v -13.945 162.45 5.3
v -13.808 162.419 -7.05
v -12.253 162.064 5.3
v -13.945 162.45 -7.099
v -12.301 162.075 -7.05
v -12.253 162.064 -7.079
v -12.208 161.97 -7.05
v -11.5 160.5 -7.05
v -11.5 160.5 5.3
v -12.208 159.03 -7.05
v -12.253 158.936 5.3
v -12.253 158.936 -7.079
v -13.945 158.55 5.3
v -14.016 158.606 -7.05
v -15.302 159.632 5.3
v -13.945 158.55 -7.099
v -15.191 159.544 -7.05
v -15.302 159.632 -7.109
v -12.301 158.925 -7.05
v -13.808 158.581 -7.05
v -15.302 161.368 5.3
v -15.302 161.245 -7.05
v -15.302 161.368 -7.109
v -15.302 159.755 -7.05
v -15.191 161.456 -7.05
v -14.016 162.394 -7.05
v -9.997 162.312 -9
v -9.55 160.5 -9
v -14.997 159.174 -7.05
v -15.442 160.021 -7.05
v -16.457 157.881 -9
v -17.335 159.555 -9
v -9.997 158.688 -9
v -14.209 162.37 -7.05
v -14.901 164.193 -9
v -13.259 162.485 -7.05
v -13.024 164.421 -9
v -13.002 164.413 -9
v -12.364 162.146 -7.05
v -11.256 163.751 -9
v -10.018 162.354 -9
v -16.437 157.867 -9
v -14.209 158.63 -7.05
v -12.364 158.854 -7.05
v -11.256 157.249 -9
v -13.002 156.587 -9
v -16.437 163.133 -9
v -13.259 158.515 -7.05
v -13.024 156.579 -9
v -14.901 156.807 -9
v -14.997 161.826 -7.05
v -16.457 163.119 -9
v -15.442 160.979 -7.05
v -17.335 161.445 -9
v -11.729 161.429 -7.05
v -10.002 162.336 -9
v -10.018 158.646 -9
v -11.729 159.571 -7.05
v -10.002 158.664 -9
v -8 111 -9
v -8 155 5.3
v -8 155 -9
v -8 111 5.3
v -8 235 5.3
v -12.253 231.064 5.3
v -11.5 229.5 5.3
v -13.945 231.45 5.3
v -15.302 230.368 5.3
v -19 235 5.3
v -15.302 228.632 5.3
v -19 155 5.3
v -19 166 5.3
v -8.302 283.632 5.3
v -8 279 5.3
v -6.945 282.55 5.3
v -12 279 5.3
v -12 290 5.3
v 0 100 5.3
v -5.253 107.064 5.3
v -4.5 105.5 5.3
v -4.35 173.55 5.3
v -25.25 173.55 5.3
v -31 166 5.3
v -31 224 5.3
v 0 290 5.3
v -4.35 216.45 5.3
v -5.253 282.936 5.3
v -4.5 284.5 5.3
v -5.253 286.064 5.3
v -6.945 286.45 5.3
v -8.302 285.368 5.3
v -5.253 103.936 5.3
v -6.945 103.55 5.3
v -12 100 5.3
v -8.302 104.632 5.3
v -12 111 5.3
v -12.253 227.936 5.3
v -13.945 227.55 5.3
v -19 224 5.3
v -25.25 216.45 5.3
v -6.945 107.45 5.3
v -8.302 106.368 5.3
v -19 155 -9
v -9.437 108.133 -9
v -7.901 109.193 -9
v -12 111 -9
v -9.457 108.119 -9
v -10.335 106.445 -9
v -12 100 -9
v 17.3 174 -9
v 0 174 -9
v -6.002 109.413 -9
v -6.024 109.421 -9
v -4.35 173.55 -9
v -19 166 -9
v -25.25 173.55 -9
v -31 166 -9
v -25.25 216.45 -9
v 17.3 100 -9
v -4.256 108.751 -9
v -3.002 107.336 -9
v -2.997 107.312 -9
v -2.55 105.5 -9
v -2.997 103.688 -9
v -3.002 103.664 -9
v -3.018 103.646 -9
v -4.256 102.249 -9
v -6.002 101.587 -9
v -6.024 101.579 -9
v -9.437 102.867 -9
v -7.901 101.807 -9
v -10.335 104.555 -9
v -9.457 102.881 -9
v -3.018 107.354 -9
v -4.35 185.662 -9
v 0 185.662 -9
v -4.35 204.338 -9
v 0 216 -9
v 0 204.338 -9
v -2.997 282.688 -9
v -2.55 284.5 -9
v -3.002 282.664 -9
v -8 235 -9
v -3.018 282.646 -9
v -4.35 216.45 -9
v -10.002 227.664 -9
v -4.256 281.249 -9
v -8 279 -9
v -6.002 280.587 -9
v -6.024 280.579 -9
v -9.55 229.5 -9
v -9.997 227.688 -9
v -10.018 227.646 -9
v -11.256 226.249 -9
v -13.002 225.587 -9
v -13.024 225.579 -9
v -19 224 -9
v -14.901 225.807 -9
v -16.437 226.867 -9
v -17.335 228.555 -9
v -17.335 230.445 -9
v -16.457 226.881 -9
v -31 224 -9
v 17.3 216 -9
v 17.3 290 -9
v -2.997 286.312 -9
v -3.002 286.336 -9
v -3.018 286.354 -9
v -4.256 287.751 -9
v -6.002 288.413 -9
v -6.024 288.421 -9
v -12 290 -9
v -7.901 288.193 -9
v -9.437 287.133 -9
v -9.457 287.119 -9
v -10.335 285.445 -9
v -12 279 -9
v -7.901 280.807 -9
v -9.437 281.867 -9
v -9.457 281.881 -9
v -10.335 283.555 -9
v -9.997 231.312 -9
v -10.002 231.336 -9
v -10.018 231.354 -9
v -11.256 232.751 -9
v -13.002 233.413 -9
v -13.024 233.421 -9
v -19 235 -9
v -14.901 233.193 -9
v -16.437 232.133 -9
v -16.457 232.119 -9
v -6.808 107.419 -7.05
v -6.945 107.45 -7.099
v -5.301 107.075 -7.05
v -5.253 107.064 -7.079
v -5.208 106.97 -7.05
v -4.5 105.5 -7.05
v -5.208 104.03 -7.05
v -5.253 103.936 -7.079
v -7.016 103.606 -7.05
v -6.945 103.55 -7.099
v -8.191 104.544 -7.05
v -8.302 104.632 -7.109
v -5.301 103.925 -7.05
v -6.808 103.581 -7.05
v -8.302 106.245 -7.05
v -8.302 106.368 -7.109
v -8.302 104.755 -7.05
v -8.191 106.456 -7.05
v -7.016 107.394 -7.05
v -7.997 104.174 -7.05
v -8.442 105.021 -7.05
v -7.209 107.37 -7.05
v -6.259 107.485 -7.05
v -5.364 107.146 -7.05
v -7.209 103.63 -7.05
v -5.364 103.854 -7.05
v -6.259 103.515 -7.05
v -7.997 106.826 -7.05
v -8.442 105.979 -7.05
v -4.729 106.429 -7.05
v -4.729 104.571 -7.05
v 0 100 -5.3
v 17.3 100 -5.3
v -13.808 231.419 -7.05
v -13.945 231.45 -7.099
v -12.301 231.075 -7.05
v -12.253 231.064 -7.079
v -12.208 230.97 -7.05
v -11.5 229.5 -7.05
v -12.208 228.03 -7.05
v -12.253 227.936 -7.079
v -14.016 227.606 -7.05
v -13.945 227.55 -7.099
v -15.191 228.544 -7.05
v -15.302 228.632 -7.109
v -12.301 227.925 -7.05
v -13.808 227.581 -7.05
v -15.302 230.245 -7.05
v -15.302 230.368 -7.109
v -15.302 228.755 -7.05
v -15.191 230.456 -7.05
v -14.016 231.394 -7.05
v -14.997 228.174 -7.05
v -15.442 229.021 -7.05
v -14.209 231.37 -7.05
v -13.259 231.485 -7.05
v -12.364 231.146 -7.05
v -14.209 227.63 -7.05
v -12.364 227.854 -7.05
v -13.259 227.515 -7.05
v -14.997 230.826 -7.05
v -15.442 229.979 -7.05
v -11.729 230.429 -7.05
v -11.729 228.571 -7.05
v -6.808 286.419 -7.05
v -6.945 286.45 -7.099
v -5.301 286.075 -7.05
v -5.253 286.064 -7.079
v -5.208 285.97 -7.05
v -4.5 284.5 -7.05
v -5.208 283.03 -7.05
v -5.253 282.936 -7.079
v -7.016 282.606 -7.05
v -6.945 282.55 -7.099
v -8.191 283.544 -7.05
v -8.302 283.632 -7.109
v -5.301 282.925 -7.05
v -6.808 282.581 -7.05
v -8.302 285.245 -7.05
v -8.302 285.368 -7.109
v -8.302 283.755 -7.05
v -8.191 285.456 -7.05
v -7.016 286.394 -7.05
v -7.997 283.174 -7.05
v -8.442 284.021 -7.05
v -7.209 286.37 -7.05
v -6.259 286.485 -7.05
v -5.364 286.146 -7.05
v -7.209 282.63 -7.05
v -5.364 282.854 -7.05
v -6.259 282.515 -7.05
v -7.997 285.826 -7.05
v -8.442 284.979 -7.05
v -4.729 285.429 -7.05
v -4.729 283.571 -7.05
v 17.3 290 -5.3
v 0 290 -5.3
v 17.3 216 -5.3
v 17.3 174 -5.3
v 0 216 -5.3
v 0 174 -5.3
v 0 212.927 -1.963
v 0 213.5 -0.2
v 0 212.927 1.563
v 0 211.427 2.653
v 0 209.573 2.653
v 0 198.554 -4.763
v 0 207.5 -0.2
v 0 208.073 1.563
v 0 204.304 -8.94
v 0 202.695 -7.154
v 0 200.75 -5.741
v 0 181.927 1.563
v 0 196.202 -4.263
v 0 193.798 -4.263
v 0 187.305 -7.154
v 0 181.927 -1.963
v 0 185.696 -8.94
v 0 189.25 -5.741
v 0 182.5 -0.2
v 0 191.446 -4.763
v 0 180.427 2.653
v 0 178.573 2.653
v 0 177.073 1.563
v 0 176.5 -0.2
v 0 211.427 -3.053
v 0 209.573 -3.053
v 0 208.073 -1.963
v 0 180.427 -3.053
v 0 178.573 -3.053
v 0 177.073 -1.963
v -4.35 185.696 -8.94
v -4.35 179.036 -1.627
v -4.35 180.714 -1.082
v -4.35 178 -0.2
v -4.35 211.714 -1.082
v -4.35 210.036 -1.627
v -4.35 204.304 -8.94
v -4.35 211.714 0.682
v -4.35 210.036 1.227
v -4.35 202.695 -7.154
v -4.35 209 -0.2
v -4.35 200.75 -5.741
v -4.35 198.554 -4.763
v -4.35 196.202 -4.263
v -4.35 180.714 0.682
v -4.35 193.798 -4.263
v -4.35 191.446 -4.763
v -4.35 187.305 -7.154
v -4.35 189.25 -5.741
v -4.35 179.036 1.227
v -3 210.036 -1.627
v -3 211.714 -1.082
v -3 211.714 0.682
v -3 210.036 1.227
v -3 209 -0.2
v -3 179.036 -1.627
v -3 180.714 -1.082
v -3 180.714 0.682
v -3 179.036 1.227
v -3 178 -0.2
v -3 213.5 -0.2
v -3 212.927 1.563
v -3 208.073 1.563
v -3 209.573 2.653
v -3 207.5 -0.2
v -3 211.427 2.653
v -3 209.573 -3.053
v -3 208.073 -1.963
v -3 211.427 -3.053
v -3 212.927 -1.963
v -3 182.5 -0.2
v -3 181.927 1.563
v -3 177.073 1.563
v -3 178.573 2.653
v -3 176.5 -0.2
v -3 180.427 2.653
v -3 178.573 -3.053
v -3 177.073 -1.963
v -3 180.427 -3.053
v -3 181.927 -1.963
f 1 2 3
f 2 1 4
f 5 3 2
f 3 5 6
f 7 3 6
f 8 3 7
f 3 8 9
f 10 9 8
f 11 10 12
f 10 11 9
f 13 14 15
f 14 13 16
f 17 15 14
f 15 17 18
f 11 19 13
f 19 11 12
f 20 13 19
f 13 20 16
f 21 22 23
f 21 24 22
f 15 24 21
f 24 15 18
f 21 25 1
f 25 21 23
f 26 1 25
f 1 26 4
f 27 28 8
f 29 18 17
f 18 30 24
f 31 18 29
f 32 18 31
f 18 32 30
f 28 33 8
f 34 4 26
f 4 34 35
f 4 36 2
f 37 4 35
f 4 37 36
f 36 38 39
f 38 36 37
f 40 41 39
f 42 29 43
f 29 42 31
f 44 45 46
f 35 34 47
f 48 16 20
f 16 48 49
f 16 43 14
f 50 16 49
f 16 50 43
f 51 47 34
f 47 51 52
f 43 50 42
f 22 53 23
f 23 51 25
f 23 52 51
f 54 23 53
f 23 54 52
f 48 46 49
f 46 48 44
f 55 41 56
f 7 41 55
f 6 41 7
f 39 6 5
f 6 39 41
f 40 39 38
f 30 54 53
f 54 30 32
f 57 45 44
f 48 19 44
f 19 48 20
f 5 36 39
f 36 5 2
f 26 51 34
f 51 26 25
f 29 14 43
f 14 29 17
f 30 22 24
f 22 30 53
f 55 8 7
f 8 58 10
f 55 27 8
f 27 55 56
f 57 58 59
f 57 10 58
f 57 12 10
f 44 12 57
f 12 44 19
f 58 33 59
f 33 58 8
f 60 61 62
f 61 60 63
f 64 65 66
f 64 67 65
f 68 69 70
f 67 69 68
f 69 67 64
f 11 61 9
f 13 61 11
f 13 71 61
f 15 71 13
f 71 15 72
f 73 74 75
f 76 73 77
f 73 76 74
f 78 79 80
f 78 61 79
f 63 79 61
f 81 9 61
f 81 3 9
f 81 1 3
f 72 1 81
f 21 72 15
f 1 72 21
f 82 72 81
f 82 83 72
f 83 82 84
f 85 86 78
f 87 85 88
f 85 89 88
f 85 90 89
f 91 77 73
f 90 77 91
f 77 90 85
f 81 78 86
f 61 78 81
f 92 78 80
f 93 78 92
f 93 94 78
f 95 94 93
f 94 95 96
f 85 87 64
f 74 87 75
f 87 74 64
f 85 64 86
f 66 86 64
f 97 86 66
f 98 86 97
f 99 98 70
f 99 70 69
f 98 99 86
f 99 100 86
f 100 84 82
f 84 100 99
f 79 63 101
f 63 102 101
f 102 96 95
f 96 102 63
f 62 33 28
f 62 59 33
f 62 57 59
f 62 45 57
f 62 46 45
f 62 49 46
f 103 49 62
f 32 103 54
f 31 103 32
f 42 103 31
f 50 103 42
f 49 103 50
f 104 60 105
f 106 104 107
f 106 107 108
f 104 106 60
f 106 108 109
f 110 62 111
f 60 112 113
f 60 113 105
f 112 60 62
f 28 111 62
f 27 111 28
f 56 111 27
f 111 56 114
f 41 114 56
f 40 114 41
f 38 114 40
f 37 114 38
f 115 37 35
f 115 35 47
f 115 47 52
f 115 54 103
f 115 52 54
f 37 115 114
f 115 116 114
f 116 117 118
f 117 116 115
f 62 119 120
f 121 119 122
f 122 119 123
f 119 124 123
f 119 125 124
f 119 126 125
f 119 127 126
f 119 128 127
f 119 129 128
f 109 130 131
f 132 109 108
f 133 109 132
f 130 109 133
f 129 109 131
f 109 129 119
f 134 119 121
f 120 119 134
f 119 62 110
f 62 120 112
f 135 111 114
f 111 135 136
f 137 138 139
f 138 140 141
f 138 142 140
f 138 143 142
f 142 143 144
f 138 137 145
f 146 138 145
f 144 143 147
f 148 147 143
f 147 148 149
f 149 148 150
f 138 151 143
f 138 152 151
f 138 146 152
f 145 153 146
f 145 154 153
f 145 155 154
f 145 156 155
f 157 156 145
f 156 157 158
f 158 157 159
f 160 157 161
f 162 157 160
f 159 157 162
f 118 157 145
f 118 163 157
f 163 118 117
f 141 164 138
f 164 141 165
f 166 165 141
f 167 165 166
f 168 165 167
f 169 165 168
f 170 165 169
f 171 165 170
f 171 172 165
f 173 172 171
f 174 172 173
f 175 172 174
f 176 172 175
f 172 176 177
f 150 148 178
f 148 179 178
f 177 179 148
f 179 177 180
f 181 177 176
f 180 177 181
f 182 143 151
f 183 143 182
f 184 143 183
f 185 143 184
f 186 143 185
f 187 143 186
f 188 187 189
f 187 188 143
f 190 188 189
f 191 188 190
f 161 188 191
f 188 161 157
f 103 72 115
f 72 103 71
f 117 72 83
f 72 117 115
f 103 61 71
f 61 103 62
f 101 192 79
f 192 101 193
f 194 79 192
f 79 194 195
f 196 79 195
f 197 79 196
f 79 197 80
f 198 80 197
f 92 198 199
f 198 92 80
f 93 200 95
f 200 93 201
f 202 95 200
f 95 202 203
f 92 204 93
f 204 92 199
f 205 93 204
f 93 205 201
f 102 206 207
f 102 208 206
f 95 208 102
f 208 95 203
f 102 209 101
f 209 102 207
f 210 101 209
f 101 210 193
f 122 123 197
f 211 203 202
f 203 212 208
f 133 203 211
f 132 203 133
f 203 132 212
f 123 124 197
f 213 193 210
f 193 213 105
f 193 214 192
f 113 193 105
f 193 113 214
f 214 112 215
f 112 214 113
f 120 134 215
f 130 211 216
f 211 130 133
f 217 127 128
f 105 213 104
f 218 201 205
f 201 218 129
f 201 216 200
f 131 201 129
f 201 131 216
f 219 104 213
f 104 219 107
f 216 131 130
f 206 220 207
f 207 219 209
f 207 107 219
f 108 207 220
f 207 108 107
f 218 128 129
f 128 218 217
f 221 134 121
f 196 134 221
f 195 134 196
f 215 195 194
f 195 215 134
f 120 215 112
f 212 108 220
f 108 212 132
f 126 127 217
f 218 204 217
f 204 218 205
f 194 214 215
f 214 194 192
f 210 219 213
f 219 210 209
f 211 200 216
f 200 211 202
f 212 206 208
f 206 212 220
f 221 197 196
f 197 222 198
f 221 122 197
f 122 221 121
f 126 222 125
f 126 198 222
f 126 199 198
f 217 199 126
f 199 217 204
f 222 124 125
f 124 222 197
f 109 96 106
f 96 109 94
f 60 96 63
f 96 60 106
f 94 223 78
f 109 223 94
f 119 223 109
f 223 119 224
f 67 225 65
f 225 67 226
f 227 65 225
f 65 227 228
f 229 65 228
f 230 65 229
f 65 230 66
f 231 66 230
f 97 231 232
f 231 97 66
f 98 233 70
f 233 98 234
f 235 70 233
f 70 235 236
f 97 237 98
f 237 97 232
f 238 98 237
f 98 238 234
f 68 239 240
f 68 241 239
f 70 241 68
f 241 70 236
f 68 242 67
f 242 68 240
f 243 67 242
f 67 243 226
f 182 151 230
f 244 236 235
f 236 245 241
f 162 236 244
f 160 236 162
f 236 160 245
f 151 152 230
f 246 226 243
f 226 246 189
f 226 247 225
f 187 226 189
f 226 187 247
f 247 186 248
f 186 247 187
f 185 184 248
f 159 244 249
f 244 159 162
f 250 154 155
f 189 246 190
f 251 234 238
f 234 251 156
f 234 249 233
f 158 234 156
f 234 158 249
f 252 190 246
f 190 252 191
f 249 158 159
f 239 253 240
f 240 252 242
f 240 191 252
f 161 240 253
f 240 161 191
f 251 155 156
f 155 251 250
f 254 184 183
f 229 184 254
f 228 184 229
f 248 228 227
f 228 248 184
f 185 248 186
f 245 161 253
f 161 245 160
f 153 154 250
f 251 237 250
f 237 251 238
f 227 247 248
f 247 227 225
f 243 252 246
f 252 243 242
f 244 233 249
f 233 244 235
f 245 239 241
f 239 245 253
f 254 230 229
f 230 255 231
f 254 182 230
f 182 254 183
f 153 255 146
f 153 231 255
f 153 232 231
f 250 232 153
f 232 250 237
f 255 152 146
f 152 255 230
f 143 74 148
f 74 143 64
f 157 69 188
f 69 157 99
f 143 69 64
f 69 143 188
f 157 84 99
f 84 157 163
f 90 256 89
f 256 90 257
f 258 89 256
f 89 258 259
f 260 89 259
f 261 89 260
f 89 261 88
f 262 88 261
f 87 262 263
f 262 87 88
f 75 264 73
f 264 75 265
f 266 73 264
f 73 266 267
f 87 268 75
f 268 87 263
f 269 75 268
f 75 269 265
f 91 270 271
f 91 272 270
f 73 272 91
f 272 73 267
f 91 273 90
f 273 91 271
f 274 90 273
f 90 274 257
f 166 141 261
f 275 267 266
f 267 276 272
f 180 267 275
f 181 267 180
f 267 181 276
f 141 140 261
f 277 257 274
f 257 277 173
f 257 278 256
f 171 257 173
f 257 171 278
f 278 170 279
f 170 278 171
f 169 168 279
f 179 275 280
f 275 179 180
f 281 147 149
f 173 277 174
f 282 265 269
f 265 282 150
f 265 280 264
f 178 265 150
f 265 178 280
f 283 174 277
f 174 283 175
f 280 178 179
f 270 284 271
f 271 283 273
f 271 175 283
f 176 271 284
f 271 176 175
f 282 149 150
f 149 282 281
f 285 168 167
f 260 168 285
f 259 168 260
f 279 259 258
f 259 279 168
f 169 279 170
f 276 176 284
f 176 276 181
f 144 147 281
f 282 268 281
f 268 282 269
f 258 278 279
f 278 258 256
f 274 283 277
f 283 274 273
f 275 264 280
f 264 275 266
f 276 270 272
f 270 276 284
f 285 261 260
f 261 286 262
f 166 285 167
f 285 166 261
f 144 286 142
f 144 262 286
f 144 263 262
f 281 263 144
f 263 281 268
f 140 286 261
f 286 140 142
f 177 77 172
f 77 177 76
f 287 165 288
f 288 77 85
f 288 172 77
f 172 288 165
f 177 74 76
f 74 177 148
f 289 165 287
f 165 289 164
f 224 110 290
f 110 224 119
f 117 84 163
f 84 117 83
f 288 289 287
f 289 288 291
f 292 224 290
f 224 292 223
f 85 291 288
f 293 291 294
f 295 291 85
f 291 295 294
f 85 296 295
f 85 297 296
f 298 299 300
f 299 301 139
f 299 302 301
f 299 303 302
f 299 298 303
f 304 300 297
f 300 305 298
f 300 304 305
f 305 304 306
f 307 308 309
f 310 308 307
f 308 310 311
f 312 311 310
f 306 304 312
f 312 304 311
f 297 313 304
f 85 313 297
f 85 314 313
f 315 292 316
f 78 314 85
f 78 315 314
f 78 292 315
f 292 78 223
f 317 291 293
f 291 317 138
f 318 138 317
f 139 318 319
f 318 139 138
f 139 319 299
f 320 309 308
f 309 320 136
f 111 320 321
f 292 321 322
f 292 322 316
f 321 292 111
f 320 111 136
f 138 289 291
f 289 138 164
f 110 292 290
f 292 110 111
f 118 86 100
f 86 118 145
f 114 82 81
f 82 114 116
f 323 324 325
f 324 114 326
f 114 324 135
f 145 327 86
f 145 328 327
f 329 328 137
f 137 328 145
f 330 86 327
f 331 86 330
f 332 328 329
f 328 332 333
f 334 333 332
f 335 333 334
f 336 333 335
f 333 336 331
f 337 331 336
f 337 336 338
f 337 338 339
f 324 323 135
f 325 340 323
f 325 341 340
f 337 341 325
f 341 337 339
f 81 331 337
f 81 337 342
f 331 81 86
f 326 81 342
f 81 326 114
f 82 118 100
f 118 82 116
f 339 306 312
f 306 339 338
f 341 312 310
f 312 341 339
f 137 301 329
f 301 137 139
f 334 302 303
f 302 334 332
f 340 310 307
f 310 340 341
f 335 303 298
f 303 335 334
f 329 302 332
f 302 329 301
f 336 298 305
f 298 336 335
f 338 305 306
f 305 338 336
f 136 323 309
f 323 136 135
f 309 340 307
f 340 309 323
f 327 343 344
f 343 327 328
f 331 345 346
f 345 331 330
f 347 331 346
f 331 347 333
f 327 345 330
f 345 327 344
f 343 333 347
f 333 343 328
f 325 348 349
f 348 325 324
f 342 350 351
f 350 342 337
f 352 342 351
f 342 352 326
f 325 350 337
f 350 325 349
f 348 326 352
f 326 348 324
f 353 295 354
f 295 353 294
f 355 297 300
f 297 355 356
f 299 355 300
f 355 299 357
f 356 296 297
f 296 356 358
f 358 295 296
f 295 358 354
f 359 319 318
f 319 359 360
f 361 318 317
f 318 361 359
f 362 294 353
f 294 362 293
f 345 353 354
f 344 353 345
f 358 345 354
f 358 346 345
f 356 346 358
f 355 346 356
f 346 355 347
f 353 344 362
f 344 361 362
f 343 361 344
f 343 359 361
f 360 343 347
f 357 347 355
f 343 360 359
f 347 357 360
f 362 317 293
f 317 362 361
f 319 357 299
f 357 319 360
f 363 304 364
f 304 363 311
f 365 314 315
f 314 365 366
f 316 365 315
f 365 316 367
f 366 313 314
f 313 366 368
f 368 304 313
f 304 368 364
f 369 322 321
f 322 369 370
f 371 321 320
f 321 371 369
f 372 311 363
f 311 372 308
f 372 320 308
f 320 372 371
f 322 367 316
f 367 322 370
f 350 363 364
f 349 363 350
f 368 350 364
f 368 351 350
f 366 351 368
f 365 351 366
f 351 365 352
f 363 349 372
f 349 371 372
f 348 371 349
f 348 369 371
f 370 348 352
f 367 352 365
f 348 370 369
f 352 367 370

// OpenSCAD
rail_length=190;
rail_thick=2.3;
rail_depth=15;

carriage_thick=3;
carriage_bowl=110+2.5+2.5;
carriage_slide_width=rail_depth*0.9+0.5;
carriage_length=carriage_bowl+carriage_slide_width*2+15-2.5-2.5;
carriage_side=(carriage_length-carriage_bowl)/2;
screw_cap=4;
g_pressure_angle=20;

mount_height=8;

// General Variables
pi = 3.14159;
rad = 57.29578;
clearance = 0.05;   // clearance between teeth

/*  Converts Radians to Degrees */
function grad(pressure_angle) = pressure_angle*rad;

/*  Converts Degrees to Radians */
function radian(pressure_angle) = pressure_angle/rad;


/*  Copy and rotate a Body */
module copier(vect, number, distance, winkel){
    for(i = [0:number-1]){
        translate(v=vect*distance*i)
            rotate(a=i*winkel, v = [0,0,1])
                children(0);
    }
}
/*  Circle Involutes-Function:
    Returns the Polar Coordinates of an Involute Circle
    r = Radius of the Base Circle
    rho = Rolling-angle in Degrees */
function ev(r,rho) = [
    r/cos(rho),
    grad(tan(rho)-radian(rho))
];
/*  Converts 2D Polar Coordinates to Cartesian
    Format: radius, phi; phi = Angle to x-Axis on xy-Plane */
function polar_to_cartesian(polvect) = [
    polvect[0]*cos(polvect[1]),  
    polvect[0]*sin(polvect[1])
];
/*  Spur gear
    modul = Height of the Tooth Tip beyond the Pitch Circle
    tooth_number = Number of Gear Teeth
    width = tooth_width
    bore = Diameter of the Center Hole
    pressure_angle = Pressure Angle, Standard = 20° according to DIN 867. Should not exceed 45°.
    helix_angle = Helix Angle to the Axis of Rotation; 0° = Spur Teeth
    optimized = Create holes for Material-/Weight-Saving or Surface Enhancements where Geometry allows */
module spur_gear(modul, tooth_number, width, bore, pressure_angle = 20, helix_angle = 0, optimized = true) {

    // Dimension Calculations  
    d = modul * tooth_number;                                           // Pitch Circle Diameter
    r = d / 2;                                                      // Pitch Circle Radius
    alpha_spur = atan(tan(pressure_angle)/cos(helix_angle));// Helix Angle in Transverse Section
    db = d * cos(alpha_spur);                                      // Base Circle Diameter
    rb = db / 2;                                                    // Base Circle Radius
    da = (modul <1)? d + modul * 2.2 : d + modul * 2;               // Tip Diameter according to DIN 58400 or DIN 867
    ra = da / 2;                                                    // Tip Circle Radius
    c =  (tooth_number <3)? 0 : modul/6;                                // Tip Clearance
    df = d - 2 * (modul + c);                                       // Root Circle Diameter
    rf = df / 2;                                                    // Root Radius
    rho_ra = acos(rb/ra);                                           // Maximum Rolling Angle;
                                                                    // Involute begins on the Base Circle and ends at the Tip Circle
    rho_r = acos(rb/r);                                             // Rolling Angle at Pitch Circle;
                                                                    // Involute begins on the Base Circle and ends at the Tip Circle
    phi_r = grad(tan(rho_r)-radian(rho_r));                         // Angle to Point of Involute on Pitch Circle
    gamma = rad*width/(r*tan(90-helix_angle));               // Torsion Angle for Extrusion
    step = rho_ra/16;                                            // Involute is divided into 16 pieces
    tau = 360/tooth_number;                                             // Pitch Angle
    
    r_hole = (2*rf - bore)/8;                                    // Radius of Holes for Material-/Weight-Saving
    rm = bore/2+2*r_hole;                                        // Distance of the Axes of the Holes from the Main Axis
    z_hole = floor(2*pi*rm/(3*r_hole));                             // Number of Holes for Material-/Weight-Saving
    
    optimized = (optimized && r >= width*1.5 && d > 2*bore);    // is Optimization useful?

    // Drawing
    union(){
        rotate([0,0,-phi_r-90*(1-clearance)/tooth_number]){                     // Center Tooth on X-Axis;
                                                                        // Makes Alignment with other Gears easier

            linear_extrude(height = width, twist = gamma){
                difference(){
                    union(){
                        tooth_width = (180*(1-clearance))/tooth_number+2*phi_r;
                        circle(rf);                                     // Root Circle 
                        for (rot = [0:tau:360]){
                            rotate (rot){                               // Copy and Rotate "Number of Teeth"
                                polygon(concat(                         // Tooth
                                    [[0,0]],                            // Tooth Segment starts and ends at Origin
                                    [for (rho = [0:step:rho_ra])     // From zero Degrees (Base Circle)
                                                                        // To Maximum Involute Angle (Tip Circle)
                                        polar_to_cartesian(ev(rb,rho))],       // First Involute Flank

                                    [polar_to_cartesian(ev(rb,rho_ra))],       // Point of Involute on Tip Circle

                                    [for (rho = [rho_ra:-step:0])    // of Maximum Involute Angle (Tip Circle)
                                                                        // to zero Degrees (Base Circle)
                                        polar_to_cartesian([ev(rb,rho)[0], tooth_width-ev(rb,rho)[1]])]
                                                                        // Second Involute Flank
                                                                        // (180*(1-clearance)) instead of 180 Degrees,
                                                                        // to allow clearance of the Flanks
                                    )
                                );
                            }
                        }
                    }           
                    circle(r = rm+r_hole*1.49);                         // "bore"
                }
            }
        }
        // with Material Savings
        if (optimized) {
            linear_extrude(height = width){
                difference(){
                        circle(r = (bore+r_hole)/2);
                        circle(r = bore/2);                          // bore
                    }
                }
            linear_extrude(height = (width-r_hole/2 < width*2/3) ? width*2/3 : width-r_hole/2){
                difference(){
                    circle(r=rm+r_hole*1.51);
                    union(){
                        circle(r=(bore+r_hole)/2);
                        for (i = [0:1:z_hole]){
                            translate(sphere_to_cartesian([rm,90,i*360/z_hole]))
                                circle(r = r_hole);
                        }
                    }
                }
            }
        }
        // without Material Savings
        else {
            linear_extrude(height = width){
                difference(){
                    circle(r = rm+r_hole*1.51);
                    circle(r = bore/2);
                }
            }
        }
    }
}
/*  Herringbone; uses the module "spur_gear"
    modul = Height of the Tooth Tip beyond the Pitch Circle
    tooth_number = Number of Gear Teeth
    width = tooth_width
    bore = Diameter of the Center Hole
    pressure_angle = Pressure Angle, Standard = 20° according to DIN 867. Should not exceed 45°.
    helix_angle = Helix Angle to the Axis of Rotation, Standard = 0° (Spur Teeth)
    optimized = Holes for Material-/Weight-Saving */
module herringbone_gear(modul, tooth_number, width, bore, pressure_angle = 20, helix_angle=0, optimized=true){

    width = width/2;
    d = modul * tooth_number;                                           // Pitch Circle Diameter
    r = d / 2;                                                      // Pitch Circle Radius
    c =  (tooth_number <3)? 0 : modul/6;                                // Tip Clearance

    df = d - 2 * (modul + c);                                       // Root Circle Diameter
    rf = df / 2;                                                    // Root Radius

    r_hole = (2*rf - bore)/8;                                    // Radius of Holes for Material-/Weight-Saving
    rm = bore/2+2*r_hole;                                        // Distance of the Axes of the Holes from the Main Axis
    z_hole = floor(2*pi*rm/(3*r_hole));                             // Number of Holes for Material-/Weight-Saving
    
    optimized = (optimized && r >= width*3 && d > 2*bore);      // is Optimization useful?

    translate([0,0,width]){
        union(){
            spur_gear(modul, tooth_number, width, 2*(rm+r_hole*1.49), pressure_angle, helix_angle, false);      // bottom Half
            mirror([0,0,1]){
                spur_gear(modul, tooth_number, width, 2*(rm+r_hole*1.49), pressure_angle, helix_angle, false);  // top Half
            }
        }
    }
    // with Material Savings
    if (optimized) {
        linear_extrude(height = width*2){
            difference(){
                    circle(r = (bore+r_hole)/2);
                    circle(r = bore/2);                          // bore
                }
            }
        linear_extrude(height = (2*width-r_hole/2 < 1.33*width) ? 1.33*width : 2*width-r_hole/2){ //width*4/3
            difference(){
                circle(r=rm+r_hole*1.51);
                union(){
                    circle(r=(bore+r_hole)/2);
                    for (i = [0:1:z_hole]){
                        translate(sphere_to_cartesian([rm,90,i*360/z_hole]))
                            circle(r = r_hole);
                    }
                }
            }
        }
    }
    // without Material Savings
    else {
        linear_extrude(height = width*2){
            difference(){
                circle(r = rm+r_hole*1.51);
                circle(r = bore/2);
            }
        }
    }
}

/*  rack
    modul = Height of the Tooth Tip above the Rolling LIne
    length = Length of the Rack
    height = Height of the Rack to the Pitch Line
    width = Width of a Tooth
    pressure_angle = Pressure Angle, Standard = 20° according to DIN 867. Should not exceed 45°.
    helix_angle = Helix Angle of the Rack Transverse Axis; 0° = Spur Teeth */
module rack(modul, length, height, width, pressure_angle = 20, helix_angle = 0) {

    // Dimension Calculations
    modul=modul*(1-clearance);
    c = modul / 6;                                              // Tip Clearance
    mx = modul/cos(helix_angle);                          // Module Shift by Helix Angle in the X-Direction
    a = 2*mx*tan(pressure_angle)+c*tan(pressure_angle);       // Flank Width
    b = pi*mx/2-2*mx*tan(pressure_angle);                      // Tip Width
    x = width*tan(helix_angle);                          // Topside Shift by Helix Angle in the X-Direction
    nz = ceil((length+abs(2*x))/(pi*mx));                       // Number of Teeth
    
    translate([-pi*mx*(nz-1)/2-a-b/2,-modul,0]){
        intersection(){                                         // Creates a Prism that fits into a Geometric Box
            copier([1,0,0], nz, pi*mx, 0){
                polyhedron(
                    points=[[0,-c,0], [a,2*modul,0], [a+b,2*modul,0], [2*a+b,-c,0], [pi*mx,-c,0], [pi*mx,modul-height,0], [0,modul-height,0], // Underside
                        [0+x,-c,width], [a+x,2*modul,width], [a+b+x,2*modul,width], [2*a+b+x,-c,width], [pi*mx+x,-c,width], [pi*mx+x,modul-height,width], [0+x,modul-height,width]],   // Topside
                    faces=[[6,5,4,3,2,1,0],                     // Underside
                        [1,8,7,0],
                        [9,8,1,2],
                        [10,9,2,3],
                        [11,10,3,4],
                        [12,11,4,5],
                        [13,12,5,6],
                        [7,13,6,0],
                        [7,8,9,10,11,12,13],                    // Topside
                    ]
                );
            };
            translate([abs(x),-height+modul-0.5,-0.5]){
                cube([length,height+modul+1,width+1]);          // Cuboid which includes the Volume of the Rack
            }   
        };
    };  
}

rack_width=rail_depth+rail_thick;

                    rack_height=5;
                    teeth_height=2;
servo_lip_catch=3;
    carriage_support=4;
servo_lip_width=3.8;


    support_tol=0.15;
    rack_side_offset=0.5;
    //side rack
    rack_depress=0.3;
module carriage(circle=true) {
    translate([rack_width+rack_side_offset,carriage_length/2,-carriage_thick+rack_depress]) rotate([-90,0,90]) {
        rack(modul=teeth_height, length=carriage_length, height=rack_height-teeth_height, width=rack_width/2,   pressure_angle=g_pressure_angle, helix_angle=30) ;
        translate([0,0,rack_width]) mirror([0,0,1]) rack(modul=teeth_height, length=carriage_length, height=rack_height-teeth_height, width=rack_width/2,   pressure_angle=g_pressure_angle, helix_angle=30) ;
    }
    
    
    intersection() {
        difference() {
            union() {
                cube([carriage_length-support_tol,carriage_length,carriage_thick+rail_thick-0.3-0.1]);
                //carriage support
                translate([rack_width+rack_side_offset,0,-carriage_support]) cube([carriage_length-rail_depth-rack_width-(support_tol)-rack_side_offset-support_tol,carriage_length,carriage_support]);
            }
            union() {
                translate([carriage_bowl/2+carriage_side,carriage_bowl/2+carriage_side,0]) {
                translate([0,0,-0.5-carriage_support-50]) cylinder(carriage_thick+1+carriage_support+50+rail_thick,carriage_bowl/2-1.5,carriage_bowl/2-1.5);
                translate([0,0,0.5+carriage_thick-0.3]) cylinder(2+0.001,carriage_bowl/2+4-1.5,carriage_bowl/2+4-1.5);
                translate([0,0,0.5+carriage_thick-0.3-2.5]) cylinder(2.5+0.001,carriage_bowl/2-1.5,carriage_bowl/2+4-1.5);
                }
            }
        }
        if (circle) { 
        translate([carriage_bowl/2+carriage_side,carriage_bowl/2+carriage_side,-50])  union() {
            cylinder(carriage_thick+carriage_support+50,carriage_bowl/2+25,carriage_bowl/2+25);
            translate([-carriage_length/2,-carriage_length/2,-0.5]) cube([carriage_length/2,carriage_length,carriage_thick+2+carriage_support+50]);
        }
    }
    }
                //translate([40+1.5,30,0]) rotate([180,0,0]) stepper_mount();
    //translate([carriage_slide_width,-20+offset+servo_lip_width,-servo_h-servo_screw_lip_height-servo_mount_thick-mount_height]) mirror([1,0,0]) servo_mount();
}


module carriage_holder() {
    carriage_holder_buffer=0.5;
    intersection() {
        difference() {
                cube([carriage_length-support_tol+carriage_holder_buffer,carriage_length+20,carriage_thick+rail_thick-0.3-0.1]);
                
                translate([carriage_bowl/2+carriage_side,carriage_bowl/2+carriage_side,-0.5-carriage_support-50]) cylinder(carriage_thick+1+carriage_support+50+rail_thick,carriage_bowl/2,carriage_bowl/2);
        }
        
    }
                //translate([40+1.5,30,0]) rotate([180,0,0]) stepper_mount();
    //translate([carriage_slide_width,-20+offset+servo_lip_width,-servo_h-servo_screw_lip_height-servo_mount_thick-mount_height]) mirror([1,0,0]) servo_mount();
}
//servo_mount_x();
module rail(l,teeth=true,  screw_thick=3) {
        difference() {
            difference() {
                //body
                union() {
                    cube([rail_depth+rail_thick,l,rail_thick*2+carriage_thick]);
                    
                    if (teeth)
                        translate([rack_width,l/2,-rail_thick]) rotate([-90,0,90]) {
                            rack(modul=teeth_height, length=l, height=rack_height-teeth_height, width=rack_width/2,   pressure_angle=g_pressure_angle, helix_angle=30) ;
                            translate([0,0,rack_width]) mirror([0,0,1]) rack(modul=teeth_height, length=l, height=rack_height-teeth_height, width=rack_width/2,   pressure_angle=g_pressure_angle, helix_angle=30) ;
                        }
                }
                //cutout
                carriage_tolerance=0.5;
                translate([-1,-0.5,rail_thick-carriage_tolerance/2]) cube([rail_depth+1,l+1,carriage_thick+carriage_tolerance]);
            }
            
            union() {
                lip=1;
                //screw
                translate([rail_depth/2,screw_thick+5,-0.5]) cylinder(rail_thick*2+carriage_thick+1,screw_thick,screw_thick);
                translate([rail_depth/2,l-screw_thick-5,-0.5]) cylinder(rail_thick*2+carriage_thick+1,screw_thick,screw_thick);
                //cap
                translate([rail_depth/2,screw_thick+5,lip-10]) cylinder(rail_thick*2+carriage_thick-lip*2+10,screw_cap,screw_cap);
                translate([rail_depth/2,l-screw_thick-5,lip-10]) cylinder(rail_thick*2+carriage_thick-lip*2+10,screw_cap,screw_cap);
            }
        }
        
}

servo_h=40;
servo_w=20;
servo_d=41;
servo_screw_lip_height=8;
servo_screw_lip_offset=8;
servo_screw_lip_thick=4-0.8;
servo_screw_inner_offset=4;
gear_thick=17; //13;
module servo() {
    difference() {
        union() {
            cube([servo_d,servo_w,servo_h]);
            //9mm offset - spin nipple
            translate([servo_d,servo_w/2,9.5]) rotate([0,90,0]) cylinder(servo_screw_lip_height,6/2,6/2);
            //lip is 8mm and 4mm thick
            translate([servo_d-servo_screw_lip_thick-servo_screw_lip_height,0,-servo_screw_lip_height]) cube([servo_screw_lip_thick,servo_w,servo_h+servo_screw_lip_height*2]);
        }
            
        union() {
            //screws offset 5mm , 5mm thick
            translate([servo_d-servo_screw_lip_thick-servo_screw_lip_offset-0.5,5,-servo_screw_inner_offset]) rotate([0,90,0]) cylinder(servo_screw_lip_thick+1,5/2,5/2);
            translate([servo_d-servo_screw_lip_thick-servo_screw_lip_offset-0.5,15,-servo_screw_inner_offset]) rotate([0,90,0]) cylinder(servo_screw_lip_thick+1,5/2,5/2);
            translate([servo_d-servo_screw_lip_thick-servo_screw_lip_offset-0.5,5,servo_screw_inner_offset+servo_h]) rotate([0,90,0]) cylinder(servo_screw_lip_thick+1,5/2,5/2);
            translate([servo_d-servo_screw_lip_thick-servo_screw_lip_offset-0.5,15,servo_screw_inner_offset+servo_h]) rotate([0,90,0]) cylinder(servo_screw_lip_thick+1,5/2,5/2);
        }
    }
    
}

servo_mount_thick=8-3;
servo_screw_depth=10;
servo_mount_depth=30;
module servo_mount() {
    translate([-servo_d,0,servo_screw_lip_height+servo_mount_thick]) {
        difference() {
            mount_tol=0.5;
            union() {
                translate([servo_d-servo_mount_depth,-servo_lip_width,servo_h-servo_lip_catch]) cube([servo_mount_depth,servo_w+servo_mount_thick+servo_lip_width,mount_height+servo_lip_catch]);
                translate([servo_d-servo_mount_depth,0,-servo_mount_thick-servo_screw_lip_height]) cube([servo_mount_depth,servo_w+servo_mount_thick,servo_h+carriage_thick+servo_screw_lip_height+servo_mount_thick+mount_height]);
            }

            union() {
                //lip is 8mm and 4mm thick
                    translate([servo_d-servo_screw_lip_thick-mount_tol/2-servo_screw_lip_offset,-1-servo_lip_width,-servo_screw_lip_height]) cube([servo_screw_lip_thick+mount_tol,servo_w+1+servo_lip_width,servo_h+servo_screw_lip_height*2]);
                translate([-0.5,-1,-mount_tol/2]) cube([servo_d+1,servo_w+1,servo_h+mount_tol]);
                
                    translate([servo_d-servo_screw_lip_thick-servo_screw_lip_offset-servo_screw_depth-0.5,5,-servo_screw_lip_thick-1]) rotate([0,90,0]) cylinder(servo_screw_lip_thick+servo_screw_lip_offset+servo_screw_depth+1,5/2,5/2);
                    translate([servo_d-servo_screw_lip_thick-servo_screw_lip_offset-servo_screw_depth-0.5,15,-servo_screw_lip_thick-1]) rotate([0,90,0]) cylinder(servo_screw_lip_thick+servo_screw_lip_offset+servo_screw_depth+1,5/2,5/2);
                
                    //translate([servo_d-servo_screw_lip_thick-servo_screw_lip_offset,5,-servo_screw_lip_thick]) rotate([0,90,0]) cylinder(servo_screw_lip_thick+servo_screw_lip_offset+1,6/2,6/2);
                    //translate([servo_d-servo_screw_lip_thick-servo_screw_lip_offset,15,-servo_screw_lip_thick]) rotate([0,90,0]) cylinder(servo_screw_lip_thick+servo_screw_lip_offset+1,6/2,6/2);
            }
        }
    }
}


module servo_mount_x() {
    translate([-servo_d,0,servo_screw_lip_height+servo_mount_thick]) {
            mount_tol=0.5;
            union() {
                //lip is 8mm and 4mm thick
                    translate([servo_d-servo_screw_lip_thick-mount_tol/2-servo_screw_lip_offset,-1,-servo_screw_lip_height]) cube([servo_screw_lip_thick+mount_tol,servo_w+1,servo_h+servo_screw_lip_height*2]);
                translate([-0.5,-1,-mount_tol/2]) cube([servo_d+1,servo_w+1,servo_h+mount_tol]);
                
                    translate([servo_d-servo_screw_lip_thick-servo_screw_lip_offset-servo_screw_depth-0.5,5,-servo_screw_lip_thick]) rotate([0,90,0]) cylinder(servo_screw_lip_thick+servo_screw_lip_offset+servo_screw_depth+1,5/2,5/2);
                    translate([servo_d-servo_screw_lip_thick-servo_screw_lip_offset-servo_screw_depth-0.5,15,-servo_screw_lip_thick]) rotate([0,90,0]) cylinder(servo_screw_lip_thick+servo_screw_lip_offset+servo_screw_depth+1,5/2,5/2);
                
                    translate([servo_d-servo_screw_lip_thick-servo_screw_lip_offset,5,-servo_screw_lip_thick]) rotate([0,90,0]) cylinder(servo_screw_lip_thick+servo_screw_lip_offset+1,6/2,6/2);
                    translate([servo_d-servo_screw_lip_thick-servo_screw_lip_offset,15,-servo_screw_lip_thick]) rotate([0,90,0]) cylinder(servo_screw_lip_thick+servo_screw_lip_offset+1,6/2,6/2);
            }
        }
}

servo_head_tolerance=0.3;
servo_head_thick=2.5;
servo_head_middle=13+servo_head_tolerance;
servo_head_tail=8+servo_head_tolerance;
servo_head_length=55;
module gear() {
    translate([0,0,gear_thick]) mirror([0,0,1]) difference() {
        //herringbone_gear (modul=2, tooth_number=24, width=gear_thick, bore=10, pressure_angle=20, helix_angle=0, optimized=false);
        herringbone_gear (modul=2, tooth_number=32, width=gear_thick, bore=10, pressure_angle=g_pressure_angle, helix_angle=0, optimized=false);
        translate([0,-servo_head_middle/2,servo_head_thick/2]) linear_extrude(height = gear_thick+10.5-9, center = true, convexity = 10, twist = 0) polygon(points=[ [0,0], [-servo_head_length/2,(servo_head_middle-servo_head_tail)/2], [-servo_head_length/2,(servo_head_middle+servo_head_tail)/2], [0,servo_head_middle], [servo_head_length/2,(servo_head_middle+servo_head_tail)/2], [servo_head_length/2,(servo_head_middle-servo_head_tail)/2]]);
    }
}
 

module gear_stepper(t=13) {
    translate([0,0,gear_thick-1 ]) difference() {
        cylinder(1.5,7.5,7.5);
        translate([0,0,-0.1]) cylinder(4+1,4,4);
    }
    difference() {
        translate([0,0,0]) mirror([0,0,0]) difference() {
            //herringbone_gear (modul=2, tooth_number=17, width=gear_thick, bore=0, pressure_angle=20, helix_angle=0, optimized=false);
            herringbone_gear (modul=2, tooth_number=t, width=gear_thick-1, bore=0, pressure_angle=g_pressure_angle, helix_angle=30, optimized=false);
        }
        translate([0,0,-0.1]) difference() {
            arm_diameter=4.5+0.8+0.2;
            cylinder(20,(arm_diameter)/2,(arm_diameter+0.4)/2);
            translate([-5,1.5+0.3,-0.5]) cube([10,5,21]);
        }
    }
}
//model

//    color([1,0,0]) translate([servo_d+carriage_slide_width,4,-servo_h]) rotate([0,0,180]) servo();
//color([1,1,1]) translate([carriage_length-carriage_slide_width,0,-rail_thick]) rail(rail_length,false);
//color([1,1,1])translate([carriage_slide_width,rail_length,-rail_thick]) rotate([0,0,180]) rail(rail_length);
translate([0,100,0]) {
    //color([0,0,1]) carriage_holder();
    //color([0,0,1]) carriage(circle=false);
    //color([0,1,0]) translate([servo_d+carriage_slide_width,4,-servo_h-mount_height]) rotate([0,0,180]) translate([servo_d,servo_w/2,9.5]) rotate([90,0,90]) gear();
    //color("green") translate([38,-15,-stepper_h]) stepper();
    //translate([-9+5,21-15,-stepper_h/2]) rotate([90,0,90]) gear_stepper();
}
translate([13.5,200,0]) rotate([0,0,180]) {
    //color("green") translate([38,-15,-stepper_h]) stepper();
    //translate([-9+5,21-15,-stepper_h/2]) rotate([90,0,90]) gear_stepper();
}

//build
//intersection() {
    //translate([15,-40,-5]) cube([50, 60, 50]);
    //rotate([180,0,0]) color([0,0,1]) carriage(circle=false);
//}
//color([1,1,1]) rotate([0,90,0])  rail(rail_length,false);
//color([1,1,1]) rotate([0,90,0])  rail(rail_length,false);
//color([1,1,1]) rotate([0,90,0])  rail(rail_length/2.2   ,false, screw_thick=1.7);
//color([1,1,1])  rotate([0,90,0]) rail(rail_length);
//color([0,1,0])  rotate([0,0,0]) gear();
       
//rotate([0,0,0]) gear_stepper(t=13);
//stepper_mount();




                        holder_rail_thick=4;
color("red"){
    translate([0,100,0]) rotate([0,0,0]) new_stepper_house();
}

//translate([carriage_length+1,100+rail_length,0]) rotate([0,0,180]) new_stepper_rail();

module screw_housing(h=carriage_thick+rack_height+holder_rail_thick+rail_thick,hole=true) {
    
        difference() {
            cube([screw_house,screw_house,h]);
            if (hole) {
                translate([screw_house/2,screw_house/2,-0.05]) cylinder(0.1+carriage_thick+rack_height+holder_thick+rail_thick,screw_dia/2,screw_dia/2);
                translate([screw_house/2,screw_house/2,-0.05]) cylinder(2,screw_dia/2+2,screw_dia/2);
            }
        }
}
module new_stepper_rail(l=rail_length+12) {
    translate([0,0,-rack_height]) { 
            shift=2;
        translate([-holder_thick*2-screw_house,20,shift]) { 
            screw_housing(h=carriage_thick+rack_height+rail_thick-shift);
        }
        translate([-holder_thick*2-screw_house,l-20,shift]) { 
            screw_housing(h=carriage_thick+rack_height+rail_thick-shift);
        }
        translate([-holder_thick*2-screw_house,l/2,shift]) { 
            screw_housing(h=carriage_thick+rack_height+rail_thick-shift);
        }
        difference() { 
            cut=8;
            translate([-holder_thick*2-1,0,shift]) cube([rack_width+holder_thick*2-1-cut,l,carriage_thick+rack_height+rail_thick-shift]);
            close_tol=0.5+0.3;
            translate([0-cut,-0.1,carriage_support+close_tol]) cube([rack_width+0.1,l+0.1*2,carriage_thick+rail_thick+0.1+1]); 
        }
    }
}

module new_stepper_house() {
    housing_offset=7;
    translate([0,0,0]) {
        
        //translate([0,0,-rack_height-holder_tol]) cube([30,40,carriage_thick+rack_height]); 
        
                //translate([-rack_width-7.5,rail_length/2-stepper_w/2,carriage_thick+rail_thick]) rotate([0,180,0]) stepper();
                //translate([gear_thick+0.5,rail_length/2,-stepper_h/2+carriage_thick+rail_thick]) rotate([0,-90,0]) gear_stepper();
        
        translate([-holder_rail_thick*2-screw_house,55,-rack_height-holder_rail_thick]) { 
            screw_housing();
        }
        translate([-holder_rail_thick*2-screw_house+housing_offset,0,-rack_height-holder_rail_thick]) { 
            screw_housing();
        }
        translate([-holder_rail_thick*2-screw_house,rail_length-55-screw_house,-rack_height-holder_rail_thick]) { 
            screw_housing();
        }
        translate([-holder_rail_thick*2-screw_house+housing_offset,rail_length-screw_house,-rack_height-holder_rail_thick]) { 
            screw_housing();
        }
        difference() { 
            
            translate([0,0,-rack_height]) {
                difference() { 
                    
                    union() {
                        //rail slide
                        translate([-holder_rail_thick*2,0,-holder_rail_thick]) cube([rack_width+holder_rail_thick*2,rail_length,carriage_thick+rack_height+holder_rail_thick+rail_thick]);
                        //motor holder
                        translate([-holder_width-holder_thick,rail_length/2-stepper_w/2-holder_thick,-holder_rail_thick]) cube([holder_width+holder_thick,stepper_w+holder_thick*2,carriage_thick+rack_height+holder_rail_thick+rail_thick]);
                    }
                    union() {
                        //rail slide cutout
                        translate([0,-0.1,-holder_tol]) cube([rack_width+0.1,rail_length+0.1*2,rack_height+carriage_thick+0.1+holder_tol+rail_thick]);
                        //gear cutout
                        translate([0,rail_length/2-stepper_w/2,-holder_thick-0.1]) cube([rack_width+0.1,stepper_w,carriage_thick+rack_height+holder_thick+0.1]);
                        
                    }
                }
            }
            
            union() {
                        
                translate([-holder_rail_thick*2-screw_house+housing_offset,0,-rack_height-holder_rail_thick]) { 
                    screw_housing(hole=false);
                }
                translate([-holder_rail_thick*2-screw_house+housing_offset,rail_length-screw_house,-rack_height-holder_rail_thick]) { 
                    screw_housing(hole=false);
                }
                translate([-rack_width-7.5,rail_length/2-stepper_w/2,carriage_thick+rail_thick]) rotate([0,180,0]) stepper();
                //holes for screws for stepper
                translate([0,rail_length/2+stepper_w/2,carriage_thick-11/2+rail_thick]) rotate([0,0,-90]) { 
                    //inner hole
                    translate([11/2,0]) rotate([90,0,0]) cylinder(10,1.5,1.5);
                    translate([stepper_w-11/2,0]) rotate([90,0,0]) cylinder(10,1.5,1.5);
                                       
                    //outter hole
                    translate([11/2,0]) rotate([90,0,0]) cylinder(stepper_motor_wall,3,3);
                    translate([stepper_w-11/2,0]) rotate([90,0,0]) cylinder(stepper_motor_wall,3,3);
                }
            }
        }
    }
}

stepper_motor_wall=3;
stepper_d=20;
stepper_h=42;
stepper_w=42;
stepper_circle=23;
stepper_circle_d=2+1+2;
tol=0.9;

holder_tol=0.3;
holder_thick=8;
holder_width=stepper_d+3;

screw_dia=4;
screw_house=11;
module stepper() {
    rotate([0,0,90]) {
        translate([-tol/2,-tol/2,0]) cube([stepper_w+tol,stepper_d+tol,stepper_h]);
        arm=20;
        translate([stepper_w/2,stepper_d+arm,stepper_h/2]) rotate([90,0,0]) cylinder(arm,4.5/2,4.5/2);
        translate([stepper_w/2,stepper_d+stepper_circle_d,stepper_h/2]) rotate([90,0,0]) cylinder(stepper_circle_d,stepper_circle/2,stepper_circle/2);
      }
}
//stepper_mount();
                    stepper_holes=11.0/2;
module stepper_mount() { 
    difference() {
        translate([0,0,0])  rotate([0,0,90])  {  
                difference() {
                    offset=-(stepper_motor_wall-2); // make sure motor gear position does not change
                    //outter box
                    translate([-tol/2,-tol/2+offset,-carriage_thick]) cube(
                            [stepper_w+stepper_motor_wall*2+tol, 
                                stepper_d+stepper_motor_wall+tol+2+1.5, //1.5 for outter hole
                                42+carriage_thick-23]);

                    //inner box
                    translate([stepper_motor_wall-tol/2,2-tol/2,stepper_motor_wall-carriage_thick]) cube([stepper_w+tol, stepper_d+tol ,stepper_h+10]);
                    
                    
                    //inner hole
                    translate([stepper_motor_wall+11/2,stepper_d+(2+3.5+tol)+0.1,stepper_holes]) rotate([90,0,0]) cylinder(10,1.5,1.5);
                    translate([stepper_motor_wall+stepper_w-11/2,stepper_d+(2+3.5+tol)+0.1,stepper_holes]) rotate([90,0,0]) cylinder(10,1.5,1.5);
               
                    //outter hole
                    translate([stepper_motor_wall+11/2,stepper_d+(2+3.5+tol)+0.1,stepper_holes]) rotate([90,0,0]) cylinder(stepper_motor_wall,3,3);
                    translate([stepper_motor_wall+stepper_w-11/2,stepper_d+(2+3.5+tol)+0.1,stepper_holes]) rotate([90,0,0]) cylinder(stepper_motor_wall,3,3);
                }
        }
        
        translate([-2,stepper_motor_wall,0]) stepper();
    }
}
//color([0,1,0]) translate([servo_d+carriage_slide_width,4,-servo_h-mount_height]) rotate([0,0,180]) translate([servo_d,servo_w/2,9.5]) rotate([90,0,90]) 
//translate([0,0,-6])cube([10,5,5]);
